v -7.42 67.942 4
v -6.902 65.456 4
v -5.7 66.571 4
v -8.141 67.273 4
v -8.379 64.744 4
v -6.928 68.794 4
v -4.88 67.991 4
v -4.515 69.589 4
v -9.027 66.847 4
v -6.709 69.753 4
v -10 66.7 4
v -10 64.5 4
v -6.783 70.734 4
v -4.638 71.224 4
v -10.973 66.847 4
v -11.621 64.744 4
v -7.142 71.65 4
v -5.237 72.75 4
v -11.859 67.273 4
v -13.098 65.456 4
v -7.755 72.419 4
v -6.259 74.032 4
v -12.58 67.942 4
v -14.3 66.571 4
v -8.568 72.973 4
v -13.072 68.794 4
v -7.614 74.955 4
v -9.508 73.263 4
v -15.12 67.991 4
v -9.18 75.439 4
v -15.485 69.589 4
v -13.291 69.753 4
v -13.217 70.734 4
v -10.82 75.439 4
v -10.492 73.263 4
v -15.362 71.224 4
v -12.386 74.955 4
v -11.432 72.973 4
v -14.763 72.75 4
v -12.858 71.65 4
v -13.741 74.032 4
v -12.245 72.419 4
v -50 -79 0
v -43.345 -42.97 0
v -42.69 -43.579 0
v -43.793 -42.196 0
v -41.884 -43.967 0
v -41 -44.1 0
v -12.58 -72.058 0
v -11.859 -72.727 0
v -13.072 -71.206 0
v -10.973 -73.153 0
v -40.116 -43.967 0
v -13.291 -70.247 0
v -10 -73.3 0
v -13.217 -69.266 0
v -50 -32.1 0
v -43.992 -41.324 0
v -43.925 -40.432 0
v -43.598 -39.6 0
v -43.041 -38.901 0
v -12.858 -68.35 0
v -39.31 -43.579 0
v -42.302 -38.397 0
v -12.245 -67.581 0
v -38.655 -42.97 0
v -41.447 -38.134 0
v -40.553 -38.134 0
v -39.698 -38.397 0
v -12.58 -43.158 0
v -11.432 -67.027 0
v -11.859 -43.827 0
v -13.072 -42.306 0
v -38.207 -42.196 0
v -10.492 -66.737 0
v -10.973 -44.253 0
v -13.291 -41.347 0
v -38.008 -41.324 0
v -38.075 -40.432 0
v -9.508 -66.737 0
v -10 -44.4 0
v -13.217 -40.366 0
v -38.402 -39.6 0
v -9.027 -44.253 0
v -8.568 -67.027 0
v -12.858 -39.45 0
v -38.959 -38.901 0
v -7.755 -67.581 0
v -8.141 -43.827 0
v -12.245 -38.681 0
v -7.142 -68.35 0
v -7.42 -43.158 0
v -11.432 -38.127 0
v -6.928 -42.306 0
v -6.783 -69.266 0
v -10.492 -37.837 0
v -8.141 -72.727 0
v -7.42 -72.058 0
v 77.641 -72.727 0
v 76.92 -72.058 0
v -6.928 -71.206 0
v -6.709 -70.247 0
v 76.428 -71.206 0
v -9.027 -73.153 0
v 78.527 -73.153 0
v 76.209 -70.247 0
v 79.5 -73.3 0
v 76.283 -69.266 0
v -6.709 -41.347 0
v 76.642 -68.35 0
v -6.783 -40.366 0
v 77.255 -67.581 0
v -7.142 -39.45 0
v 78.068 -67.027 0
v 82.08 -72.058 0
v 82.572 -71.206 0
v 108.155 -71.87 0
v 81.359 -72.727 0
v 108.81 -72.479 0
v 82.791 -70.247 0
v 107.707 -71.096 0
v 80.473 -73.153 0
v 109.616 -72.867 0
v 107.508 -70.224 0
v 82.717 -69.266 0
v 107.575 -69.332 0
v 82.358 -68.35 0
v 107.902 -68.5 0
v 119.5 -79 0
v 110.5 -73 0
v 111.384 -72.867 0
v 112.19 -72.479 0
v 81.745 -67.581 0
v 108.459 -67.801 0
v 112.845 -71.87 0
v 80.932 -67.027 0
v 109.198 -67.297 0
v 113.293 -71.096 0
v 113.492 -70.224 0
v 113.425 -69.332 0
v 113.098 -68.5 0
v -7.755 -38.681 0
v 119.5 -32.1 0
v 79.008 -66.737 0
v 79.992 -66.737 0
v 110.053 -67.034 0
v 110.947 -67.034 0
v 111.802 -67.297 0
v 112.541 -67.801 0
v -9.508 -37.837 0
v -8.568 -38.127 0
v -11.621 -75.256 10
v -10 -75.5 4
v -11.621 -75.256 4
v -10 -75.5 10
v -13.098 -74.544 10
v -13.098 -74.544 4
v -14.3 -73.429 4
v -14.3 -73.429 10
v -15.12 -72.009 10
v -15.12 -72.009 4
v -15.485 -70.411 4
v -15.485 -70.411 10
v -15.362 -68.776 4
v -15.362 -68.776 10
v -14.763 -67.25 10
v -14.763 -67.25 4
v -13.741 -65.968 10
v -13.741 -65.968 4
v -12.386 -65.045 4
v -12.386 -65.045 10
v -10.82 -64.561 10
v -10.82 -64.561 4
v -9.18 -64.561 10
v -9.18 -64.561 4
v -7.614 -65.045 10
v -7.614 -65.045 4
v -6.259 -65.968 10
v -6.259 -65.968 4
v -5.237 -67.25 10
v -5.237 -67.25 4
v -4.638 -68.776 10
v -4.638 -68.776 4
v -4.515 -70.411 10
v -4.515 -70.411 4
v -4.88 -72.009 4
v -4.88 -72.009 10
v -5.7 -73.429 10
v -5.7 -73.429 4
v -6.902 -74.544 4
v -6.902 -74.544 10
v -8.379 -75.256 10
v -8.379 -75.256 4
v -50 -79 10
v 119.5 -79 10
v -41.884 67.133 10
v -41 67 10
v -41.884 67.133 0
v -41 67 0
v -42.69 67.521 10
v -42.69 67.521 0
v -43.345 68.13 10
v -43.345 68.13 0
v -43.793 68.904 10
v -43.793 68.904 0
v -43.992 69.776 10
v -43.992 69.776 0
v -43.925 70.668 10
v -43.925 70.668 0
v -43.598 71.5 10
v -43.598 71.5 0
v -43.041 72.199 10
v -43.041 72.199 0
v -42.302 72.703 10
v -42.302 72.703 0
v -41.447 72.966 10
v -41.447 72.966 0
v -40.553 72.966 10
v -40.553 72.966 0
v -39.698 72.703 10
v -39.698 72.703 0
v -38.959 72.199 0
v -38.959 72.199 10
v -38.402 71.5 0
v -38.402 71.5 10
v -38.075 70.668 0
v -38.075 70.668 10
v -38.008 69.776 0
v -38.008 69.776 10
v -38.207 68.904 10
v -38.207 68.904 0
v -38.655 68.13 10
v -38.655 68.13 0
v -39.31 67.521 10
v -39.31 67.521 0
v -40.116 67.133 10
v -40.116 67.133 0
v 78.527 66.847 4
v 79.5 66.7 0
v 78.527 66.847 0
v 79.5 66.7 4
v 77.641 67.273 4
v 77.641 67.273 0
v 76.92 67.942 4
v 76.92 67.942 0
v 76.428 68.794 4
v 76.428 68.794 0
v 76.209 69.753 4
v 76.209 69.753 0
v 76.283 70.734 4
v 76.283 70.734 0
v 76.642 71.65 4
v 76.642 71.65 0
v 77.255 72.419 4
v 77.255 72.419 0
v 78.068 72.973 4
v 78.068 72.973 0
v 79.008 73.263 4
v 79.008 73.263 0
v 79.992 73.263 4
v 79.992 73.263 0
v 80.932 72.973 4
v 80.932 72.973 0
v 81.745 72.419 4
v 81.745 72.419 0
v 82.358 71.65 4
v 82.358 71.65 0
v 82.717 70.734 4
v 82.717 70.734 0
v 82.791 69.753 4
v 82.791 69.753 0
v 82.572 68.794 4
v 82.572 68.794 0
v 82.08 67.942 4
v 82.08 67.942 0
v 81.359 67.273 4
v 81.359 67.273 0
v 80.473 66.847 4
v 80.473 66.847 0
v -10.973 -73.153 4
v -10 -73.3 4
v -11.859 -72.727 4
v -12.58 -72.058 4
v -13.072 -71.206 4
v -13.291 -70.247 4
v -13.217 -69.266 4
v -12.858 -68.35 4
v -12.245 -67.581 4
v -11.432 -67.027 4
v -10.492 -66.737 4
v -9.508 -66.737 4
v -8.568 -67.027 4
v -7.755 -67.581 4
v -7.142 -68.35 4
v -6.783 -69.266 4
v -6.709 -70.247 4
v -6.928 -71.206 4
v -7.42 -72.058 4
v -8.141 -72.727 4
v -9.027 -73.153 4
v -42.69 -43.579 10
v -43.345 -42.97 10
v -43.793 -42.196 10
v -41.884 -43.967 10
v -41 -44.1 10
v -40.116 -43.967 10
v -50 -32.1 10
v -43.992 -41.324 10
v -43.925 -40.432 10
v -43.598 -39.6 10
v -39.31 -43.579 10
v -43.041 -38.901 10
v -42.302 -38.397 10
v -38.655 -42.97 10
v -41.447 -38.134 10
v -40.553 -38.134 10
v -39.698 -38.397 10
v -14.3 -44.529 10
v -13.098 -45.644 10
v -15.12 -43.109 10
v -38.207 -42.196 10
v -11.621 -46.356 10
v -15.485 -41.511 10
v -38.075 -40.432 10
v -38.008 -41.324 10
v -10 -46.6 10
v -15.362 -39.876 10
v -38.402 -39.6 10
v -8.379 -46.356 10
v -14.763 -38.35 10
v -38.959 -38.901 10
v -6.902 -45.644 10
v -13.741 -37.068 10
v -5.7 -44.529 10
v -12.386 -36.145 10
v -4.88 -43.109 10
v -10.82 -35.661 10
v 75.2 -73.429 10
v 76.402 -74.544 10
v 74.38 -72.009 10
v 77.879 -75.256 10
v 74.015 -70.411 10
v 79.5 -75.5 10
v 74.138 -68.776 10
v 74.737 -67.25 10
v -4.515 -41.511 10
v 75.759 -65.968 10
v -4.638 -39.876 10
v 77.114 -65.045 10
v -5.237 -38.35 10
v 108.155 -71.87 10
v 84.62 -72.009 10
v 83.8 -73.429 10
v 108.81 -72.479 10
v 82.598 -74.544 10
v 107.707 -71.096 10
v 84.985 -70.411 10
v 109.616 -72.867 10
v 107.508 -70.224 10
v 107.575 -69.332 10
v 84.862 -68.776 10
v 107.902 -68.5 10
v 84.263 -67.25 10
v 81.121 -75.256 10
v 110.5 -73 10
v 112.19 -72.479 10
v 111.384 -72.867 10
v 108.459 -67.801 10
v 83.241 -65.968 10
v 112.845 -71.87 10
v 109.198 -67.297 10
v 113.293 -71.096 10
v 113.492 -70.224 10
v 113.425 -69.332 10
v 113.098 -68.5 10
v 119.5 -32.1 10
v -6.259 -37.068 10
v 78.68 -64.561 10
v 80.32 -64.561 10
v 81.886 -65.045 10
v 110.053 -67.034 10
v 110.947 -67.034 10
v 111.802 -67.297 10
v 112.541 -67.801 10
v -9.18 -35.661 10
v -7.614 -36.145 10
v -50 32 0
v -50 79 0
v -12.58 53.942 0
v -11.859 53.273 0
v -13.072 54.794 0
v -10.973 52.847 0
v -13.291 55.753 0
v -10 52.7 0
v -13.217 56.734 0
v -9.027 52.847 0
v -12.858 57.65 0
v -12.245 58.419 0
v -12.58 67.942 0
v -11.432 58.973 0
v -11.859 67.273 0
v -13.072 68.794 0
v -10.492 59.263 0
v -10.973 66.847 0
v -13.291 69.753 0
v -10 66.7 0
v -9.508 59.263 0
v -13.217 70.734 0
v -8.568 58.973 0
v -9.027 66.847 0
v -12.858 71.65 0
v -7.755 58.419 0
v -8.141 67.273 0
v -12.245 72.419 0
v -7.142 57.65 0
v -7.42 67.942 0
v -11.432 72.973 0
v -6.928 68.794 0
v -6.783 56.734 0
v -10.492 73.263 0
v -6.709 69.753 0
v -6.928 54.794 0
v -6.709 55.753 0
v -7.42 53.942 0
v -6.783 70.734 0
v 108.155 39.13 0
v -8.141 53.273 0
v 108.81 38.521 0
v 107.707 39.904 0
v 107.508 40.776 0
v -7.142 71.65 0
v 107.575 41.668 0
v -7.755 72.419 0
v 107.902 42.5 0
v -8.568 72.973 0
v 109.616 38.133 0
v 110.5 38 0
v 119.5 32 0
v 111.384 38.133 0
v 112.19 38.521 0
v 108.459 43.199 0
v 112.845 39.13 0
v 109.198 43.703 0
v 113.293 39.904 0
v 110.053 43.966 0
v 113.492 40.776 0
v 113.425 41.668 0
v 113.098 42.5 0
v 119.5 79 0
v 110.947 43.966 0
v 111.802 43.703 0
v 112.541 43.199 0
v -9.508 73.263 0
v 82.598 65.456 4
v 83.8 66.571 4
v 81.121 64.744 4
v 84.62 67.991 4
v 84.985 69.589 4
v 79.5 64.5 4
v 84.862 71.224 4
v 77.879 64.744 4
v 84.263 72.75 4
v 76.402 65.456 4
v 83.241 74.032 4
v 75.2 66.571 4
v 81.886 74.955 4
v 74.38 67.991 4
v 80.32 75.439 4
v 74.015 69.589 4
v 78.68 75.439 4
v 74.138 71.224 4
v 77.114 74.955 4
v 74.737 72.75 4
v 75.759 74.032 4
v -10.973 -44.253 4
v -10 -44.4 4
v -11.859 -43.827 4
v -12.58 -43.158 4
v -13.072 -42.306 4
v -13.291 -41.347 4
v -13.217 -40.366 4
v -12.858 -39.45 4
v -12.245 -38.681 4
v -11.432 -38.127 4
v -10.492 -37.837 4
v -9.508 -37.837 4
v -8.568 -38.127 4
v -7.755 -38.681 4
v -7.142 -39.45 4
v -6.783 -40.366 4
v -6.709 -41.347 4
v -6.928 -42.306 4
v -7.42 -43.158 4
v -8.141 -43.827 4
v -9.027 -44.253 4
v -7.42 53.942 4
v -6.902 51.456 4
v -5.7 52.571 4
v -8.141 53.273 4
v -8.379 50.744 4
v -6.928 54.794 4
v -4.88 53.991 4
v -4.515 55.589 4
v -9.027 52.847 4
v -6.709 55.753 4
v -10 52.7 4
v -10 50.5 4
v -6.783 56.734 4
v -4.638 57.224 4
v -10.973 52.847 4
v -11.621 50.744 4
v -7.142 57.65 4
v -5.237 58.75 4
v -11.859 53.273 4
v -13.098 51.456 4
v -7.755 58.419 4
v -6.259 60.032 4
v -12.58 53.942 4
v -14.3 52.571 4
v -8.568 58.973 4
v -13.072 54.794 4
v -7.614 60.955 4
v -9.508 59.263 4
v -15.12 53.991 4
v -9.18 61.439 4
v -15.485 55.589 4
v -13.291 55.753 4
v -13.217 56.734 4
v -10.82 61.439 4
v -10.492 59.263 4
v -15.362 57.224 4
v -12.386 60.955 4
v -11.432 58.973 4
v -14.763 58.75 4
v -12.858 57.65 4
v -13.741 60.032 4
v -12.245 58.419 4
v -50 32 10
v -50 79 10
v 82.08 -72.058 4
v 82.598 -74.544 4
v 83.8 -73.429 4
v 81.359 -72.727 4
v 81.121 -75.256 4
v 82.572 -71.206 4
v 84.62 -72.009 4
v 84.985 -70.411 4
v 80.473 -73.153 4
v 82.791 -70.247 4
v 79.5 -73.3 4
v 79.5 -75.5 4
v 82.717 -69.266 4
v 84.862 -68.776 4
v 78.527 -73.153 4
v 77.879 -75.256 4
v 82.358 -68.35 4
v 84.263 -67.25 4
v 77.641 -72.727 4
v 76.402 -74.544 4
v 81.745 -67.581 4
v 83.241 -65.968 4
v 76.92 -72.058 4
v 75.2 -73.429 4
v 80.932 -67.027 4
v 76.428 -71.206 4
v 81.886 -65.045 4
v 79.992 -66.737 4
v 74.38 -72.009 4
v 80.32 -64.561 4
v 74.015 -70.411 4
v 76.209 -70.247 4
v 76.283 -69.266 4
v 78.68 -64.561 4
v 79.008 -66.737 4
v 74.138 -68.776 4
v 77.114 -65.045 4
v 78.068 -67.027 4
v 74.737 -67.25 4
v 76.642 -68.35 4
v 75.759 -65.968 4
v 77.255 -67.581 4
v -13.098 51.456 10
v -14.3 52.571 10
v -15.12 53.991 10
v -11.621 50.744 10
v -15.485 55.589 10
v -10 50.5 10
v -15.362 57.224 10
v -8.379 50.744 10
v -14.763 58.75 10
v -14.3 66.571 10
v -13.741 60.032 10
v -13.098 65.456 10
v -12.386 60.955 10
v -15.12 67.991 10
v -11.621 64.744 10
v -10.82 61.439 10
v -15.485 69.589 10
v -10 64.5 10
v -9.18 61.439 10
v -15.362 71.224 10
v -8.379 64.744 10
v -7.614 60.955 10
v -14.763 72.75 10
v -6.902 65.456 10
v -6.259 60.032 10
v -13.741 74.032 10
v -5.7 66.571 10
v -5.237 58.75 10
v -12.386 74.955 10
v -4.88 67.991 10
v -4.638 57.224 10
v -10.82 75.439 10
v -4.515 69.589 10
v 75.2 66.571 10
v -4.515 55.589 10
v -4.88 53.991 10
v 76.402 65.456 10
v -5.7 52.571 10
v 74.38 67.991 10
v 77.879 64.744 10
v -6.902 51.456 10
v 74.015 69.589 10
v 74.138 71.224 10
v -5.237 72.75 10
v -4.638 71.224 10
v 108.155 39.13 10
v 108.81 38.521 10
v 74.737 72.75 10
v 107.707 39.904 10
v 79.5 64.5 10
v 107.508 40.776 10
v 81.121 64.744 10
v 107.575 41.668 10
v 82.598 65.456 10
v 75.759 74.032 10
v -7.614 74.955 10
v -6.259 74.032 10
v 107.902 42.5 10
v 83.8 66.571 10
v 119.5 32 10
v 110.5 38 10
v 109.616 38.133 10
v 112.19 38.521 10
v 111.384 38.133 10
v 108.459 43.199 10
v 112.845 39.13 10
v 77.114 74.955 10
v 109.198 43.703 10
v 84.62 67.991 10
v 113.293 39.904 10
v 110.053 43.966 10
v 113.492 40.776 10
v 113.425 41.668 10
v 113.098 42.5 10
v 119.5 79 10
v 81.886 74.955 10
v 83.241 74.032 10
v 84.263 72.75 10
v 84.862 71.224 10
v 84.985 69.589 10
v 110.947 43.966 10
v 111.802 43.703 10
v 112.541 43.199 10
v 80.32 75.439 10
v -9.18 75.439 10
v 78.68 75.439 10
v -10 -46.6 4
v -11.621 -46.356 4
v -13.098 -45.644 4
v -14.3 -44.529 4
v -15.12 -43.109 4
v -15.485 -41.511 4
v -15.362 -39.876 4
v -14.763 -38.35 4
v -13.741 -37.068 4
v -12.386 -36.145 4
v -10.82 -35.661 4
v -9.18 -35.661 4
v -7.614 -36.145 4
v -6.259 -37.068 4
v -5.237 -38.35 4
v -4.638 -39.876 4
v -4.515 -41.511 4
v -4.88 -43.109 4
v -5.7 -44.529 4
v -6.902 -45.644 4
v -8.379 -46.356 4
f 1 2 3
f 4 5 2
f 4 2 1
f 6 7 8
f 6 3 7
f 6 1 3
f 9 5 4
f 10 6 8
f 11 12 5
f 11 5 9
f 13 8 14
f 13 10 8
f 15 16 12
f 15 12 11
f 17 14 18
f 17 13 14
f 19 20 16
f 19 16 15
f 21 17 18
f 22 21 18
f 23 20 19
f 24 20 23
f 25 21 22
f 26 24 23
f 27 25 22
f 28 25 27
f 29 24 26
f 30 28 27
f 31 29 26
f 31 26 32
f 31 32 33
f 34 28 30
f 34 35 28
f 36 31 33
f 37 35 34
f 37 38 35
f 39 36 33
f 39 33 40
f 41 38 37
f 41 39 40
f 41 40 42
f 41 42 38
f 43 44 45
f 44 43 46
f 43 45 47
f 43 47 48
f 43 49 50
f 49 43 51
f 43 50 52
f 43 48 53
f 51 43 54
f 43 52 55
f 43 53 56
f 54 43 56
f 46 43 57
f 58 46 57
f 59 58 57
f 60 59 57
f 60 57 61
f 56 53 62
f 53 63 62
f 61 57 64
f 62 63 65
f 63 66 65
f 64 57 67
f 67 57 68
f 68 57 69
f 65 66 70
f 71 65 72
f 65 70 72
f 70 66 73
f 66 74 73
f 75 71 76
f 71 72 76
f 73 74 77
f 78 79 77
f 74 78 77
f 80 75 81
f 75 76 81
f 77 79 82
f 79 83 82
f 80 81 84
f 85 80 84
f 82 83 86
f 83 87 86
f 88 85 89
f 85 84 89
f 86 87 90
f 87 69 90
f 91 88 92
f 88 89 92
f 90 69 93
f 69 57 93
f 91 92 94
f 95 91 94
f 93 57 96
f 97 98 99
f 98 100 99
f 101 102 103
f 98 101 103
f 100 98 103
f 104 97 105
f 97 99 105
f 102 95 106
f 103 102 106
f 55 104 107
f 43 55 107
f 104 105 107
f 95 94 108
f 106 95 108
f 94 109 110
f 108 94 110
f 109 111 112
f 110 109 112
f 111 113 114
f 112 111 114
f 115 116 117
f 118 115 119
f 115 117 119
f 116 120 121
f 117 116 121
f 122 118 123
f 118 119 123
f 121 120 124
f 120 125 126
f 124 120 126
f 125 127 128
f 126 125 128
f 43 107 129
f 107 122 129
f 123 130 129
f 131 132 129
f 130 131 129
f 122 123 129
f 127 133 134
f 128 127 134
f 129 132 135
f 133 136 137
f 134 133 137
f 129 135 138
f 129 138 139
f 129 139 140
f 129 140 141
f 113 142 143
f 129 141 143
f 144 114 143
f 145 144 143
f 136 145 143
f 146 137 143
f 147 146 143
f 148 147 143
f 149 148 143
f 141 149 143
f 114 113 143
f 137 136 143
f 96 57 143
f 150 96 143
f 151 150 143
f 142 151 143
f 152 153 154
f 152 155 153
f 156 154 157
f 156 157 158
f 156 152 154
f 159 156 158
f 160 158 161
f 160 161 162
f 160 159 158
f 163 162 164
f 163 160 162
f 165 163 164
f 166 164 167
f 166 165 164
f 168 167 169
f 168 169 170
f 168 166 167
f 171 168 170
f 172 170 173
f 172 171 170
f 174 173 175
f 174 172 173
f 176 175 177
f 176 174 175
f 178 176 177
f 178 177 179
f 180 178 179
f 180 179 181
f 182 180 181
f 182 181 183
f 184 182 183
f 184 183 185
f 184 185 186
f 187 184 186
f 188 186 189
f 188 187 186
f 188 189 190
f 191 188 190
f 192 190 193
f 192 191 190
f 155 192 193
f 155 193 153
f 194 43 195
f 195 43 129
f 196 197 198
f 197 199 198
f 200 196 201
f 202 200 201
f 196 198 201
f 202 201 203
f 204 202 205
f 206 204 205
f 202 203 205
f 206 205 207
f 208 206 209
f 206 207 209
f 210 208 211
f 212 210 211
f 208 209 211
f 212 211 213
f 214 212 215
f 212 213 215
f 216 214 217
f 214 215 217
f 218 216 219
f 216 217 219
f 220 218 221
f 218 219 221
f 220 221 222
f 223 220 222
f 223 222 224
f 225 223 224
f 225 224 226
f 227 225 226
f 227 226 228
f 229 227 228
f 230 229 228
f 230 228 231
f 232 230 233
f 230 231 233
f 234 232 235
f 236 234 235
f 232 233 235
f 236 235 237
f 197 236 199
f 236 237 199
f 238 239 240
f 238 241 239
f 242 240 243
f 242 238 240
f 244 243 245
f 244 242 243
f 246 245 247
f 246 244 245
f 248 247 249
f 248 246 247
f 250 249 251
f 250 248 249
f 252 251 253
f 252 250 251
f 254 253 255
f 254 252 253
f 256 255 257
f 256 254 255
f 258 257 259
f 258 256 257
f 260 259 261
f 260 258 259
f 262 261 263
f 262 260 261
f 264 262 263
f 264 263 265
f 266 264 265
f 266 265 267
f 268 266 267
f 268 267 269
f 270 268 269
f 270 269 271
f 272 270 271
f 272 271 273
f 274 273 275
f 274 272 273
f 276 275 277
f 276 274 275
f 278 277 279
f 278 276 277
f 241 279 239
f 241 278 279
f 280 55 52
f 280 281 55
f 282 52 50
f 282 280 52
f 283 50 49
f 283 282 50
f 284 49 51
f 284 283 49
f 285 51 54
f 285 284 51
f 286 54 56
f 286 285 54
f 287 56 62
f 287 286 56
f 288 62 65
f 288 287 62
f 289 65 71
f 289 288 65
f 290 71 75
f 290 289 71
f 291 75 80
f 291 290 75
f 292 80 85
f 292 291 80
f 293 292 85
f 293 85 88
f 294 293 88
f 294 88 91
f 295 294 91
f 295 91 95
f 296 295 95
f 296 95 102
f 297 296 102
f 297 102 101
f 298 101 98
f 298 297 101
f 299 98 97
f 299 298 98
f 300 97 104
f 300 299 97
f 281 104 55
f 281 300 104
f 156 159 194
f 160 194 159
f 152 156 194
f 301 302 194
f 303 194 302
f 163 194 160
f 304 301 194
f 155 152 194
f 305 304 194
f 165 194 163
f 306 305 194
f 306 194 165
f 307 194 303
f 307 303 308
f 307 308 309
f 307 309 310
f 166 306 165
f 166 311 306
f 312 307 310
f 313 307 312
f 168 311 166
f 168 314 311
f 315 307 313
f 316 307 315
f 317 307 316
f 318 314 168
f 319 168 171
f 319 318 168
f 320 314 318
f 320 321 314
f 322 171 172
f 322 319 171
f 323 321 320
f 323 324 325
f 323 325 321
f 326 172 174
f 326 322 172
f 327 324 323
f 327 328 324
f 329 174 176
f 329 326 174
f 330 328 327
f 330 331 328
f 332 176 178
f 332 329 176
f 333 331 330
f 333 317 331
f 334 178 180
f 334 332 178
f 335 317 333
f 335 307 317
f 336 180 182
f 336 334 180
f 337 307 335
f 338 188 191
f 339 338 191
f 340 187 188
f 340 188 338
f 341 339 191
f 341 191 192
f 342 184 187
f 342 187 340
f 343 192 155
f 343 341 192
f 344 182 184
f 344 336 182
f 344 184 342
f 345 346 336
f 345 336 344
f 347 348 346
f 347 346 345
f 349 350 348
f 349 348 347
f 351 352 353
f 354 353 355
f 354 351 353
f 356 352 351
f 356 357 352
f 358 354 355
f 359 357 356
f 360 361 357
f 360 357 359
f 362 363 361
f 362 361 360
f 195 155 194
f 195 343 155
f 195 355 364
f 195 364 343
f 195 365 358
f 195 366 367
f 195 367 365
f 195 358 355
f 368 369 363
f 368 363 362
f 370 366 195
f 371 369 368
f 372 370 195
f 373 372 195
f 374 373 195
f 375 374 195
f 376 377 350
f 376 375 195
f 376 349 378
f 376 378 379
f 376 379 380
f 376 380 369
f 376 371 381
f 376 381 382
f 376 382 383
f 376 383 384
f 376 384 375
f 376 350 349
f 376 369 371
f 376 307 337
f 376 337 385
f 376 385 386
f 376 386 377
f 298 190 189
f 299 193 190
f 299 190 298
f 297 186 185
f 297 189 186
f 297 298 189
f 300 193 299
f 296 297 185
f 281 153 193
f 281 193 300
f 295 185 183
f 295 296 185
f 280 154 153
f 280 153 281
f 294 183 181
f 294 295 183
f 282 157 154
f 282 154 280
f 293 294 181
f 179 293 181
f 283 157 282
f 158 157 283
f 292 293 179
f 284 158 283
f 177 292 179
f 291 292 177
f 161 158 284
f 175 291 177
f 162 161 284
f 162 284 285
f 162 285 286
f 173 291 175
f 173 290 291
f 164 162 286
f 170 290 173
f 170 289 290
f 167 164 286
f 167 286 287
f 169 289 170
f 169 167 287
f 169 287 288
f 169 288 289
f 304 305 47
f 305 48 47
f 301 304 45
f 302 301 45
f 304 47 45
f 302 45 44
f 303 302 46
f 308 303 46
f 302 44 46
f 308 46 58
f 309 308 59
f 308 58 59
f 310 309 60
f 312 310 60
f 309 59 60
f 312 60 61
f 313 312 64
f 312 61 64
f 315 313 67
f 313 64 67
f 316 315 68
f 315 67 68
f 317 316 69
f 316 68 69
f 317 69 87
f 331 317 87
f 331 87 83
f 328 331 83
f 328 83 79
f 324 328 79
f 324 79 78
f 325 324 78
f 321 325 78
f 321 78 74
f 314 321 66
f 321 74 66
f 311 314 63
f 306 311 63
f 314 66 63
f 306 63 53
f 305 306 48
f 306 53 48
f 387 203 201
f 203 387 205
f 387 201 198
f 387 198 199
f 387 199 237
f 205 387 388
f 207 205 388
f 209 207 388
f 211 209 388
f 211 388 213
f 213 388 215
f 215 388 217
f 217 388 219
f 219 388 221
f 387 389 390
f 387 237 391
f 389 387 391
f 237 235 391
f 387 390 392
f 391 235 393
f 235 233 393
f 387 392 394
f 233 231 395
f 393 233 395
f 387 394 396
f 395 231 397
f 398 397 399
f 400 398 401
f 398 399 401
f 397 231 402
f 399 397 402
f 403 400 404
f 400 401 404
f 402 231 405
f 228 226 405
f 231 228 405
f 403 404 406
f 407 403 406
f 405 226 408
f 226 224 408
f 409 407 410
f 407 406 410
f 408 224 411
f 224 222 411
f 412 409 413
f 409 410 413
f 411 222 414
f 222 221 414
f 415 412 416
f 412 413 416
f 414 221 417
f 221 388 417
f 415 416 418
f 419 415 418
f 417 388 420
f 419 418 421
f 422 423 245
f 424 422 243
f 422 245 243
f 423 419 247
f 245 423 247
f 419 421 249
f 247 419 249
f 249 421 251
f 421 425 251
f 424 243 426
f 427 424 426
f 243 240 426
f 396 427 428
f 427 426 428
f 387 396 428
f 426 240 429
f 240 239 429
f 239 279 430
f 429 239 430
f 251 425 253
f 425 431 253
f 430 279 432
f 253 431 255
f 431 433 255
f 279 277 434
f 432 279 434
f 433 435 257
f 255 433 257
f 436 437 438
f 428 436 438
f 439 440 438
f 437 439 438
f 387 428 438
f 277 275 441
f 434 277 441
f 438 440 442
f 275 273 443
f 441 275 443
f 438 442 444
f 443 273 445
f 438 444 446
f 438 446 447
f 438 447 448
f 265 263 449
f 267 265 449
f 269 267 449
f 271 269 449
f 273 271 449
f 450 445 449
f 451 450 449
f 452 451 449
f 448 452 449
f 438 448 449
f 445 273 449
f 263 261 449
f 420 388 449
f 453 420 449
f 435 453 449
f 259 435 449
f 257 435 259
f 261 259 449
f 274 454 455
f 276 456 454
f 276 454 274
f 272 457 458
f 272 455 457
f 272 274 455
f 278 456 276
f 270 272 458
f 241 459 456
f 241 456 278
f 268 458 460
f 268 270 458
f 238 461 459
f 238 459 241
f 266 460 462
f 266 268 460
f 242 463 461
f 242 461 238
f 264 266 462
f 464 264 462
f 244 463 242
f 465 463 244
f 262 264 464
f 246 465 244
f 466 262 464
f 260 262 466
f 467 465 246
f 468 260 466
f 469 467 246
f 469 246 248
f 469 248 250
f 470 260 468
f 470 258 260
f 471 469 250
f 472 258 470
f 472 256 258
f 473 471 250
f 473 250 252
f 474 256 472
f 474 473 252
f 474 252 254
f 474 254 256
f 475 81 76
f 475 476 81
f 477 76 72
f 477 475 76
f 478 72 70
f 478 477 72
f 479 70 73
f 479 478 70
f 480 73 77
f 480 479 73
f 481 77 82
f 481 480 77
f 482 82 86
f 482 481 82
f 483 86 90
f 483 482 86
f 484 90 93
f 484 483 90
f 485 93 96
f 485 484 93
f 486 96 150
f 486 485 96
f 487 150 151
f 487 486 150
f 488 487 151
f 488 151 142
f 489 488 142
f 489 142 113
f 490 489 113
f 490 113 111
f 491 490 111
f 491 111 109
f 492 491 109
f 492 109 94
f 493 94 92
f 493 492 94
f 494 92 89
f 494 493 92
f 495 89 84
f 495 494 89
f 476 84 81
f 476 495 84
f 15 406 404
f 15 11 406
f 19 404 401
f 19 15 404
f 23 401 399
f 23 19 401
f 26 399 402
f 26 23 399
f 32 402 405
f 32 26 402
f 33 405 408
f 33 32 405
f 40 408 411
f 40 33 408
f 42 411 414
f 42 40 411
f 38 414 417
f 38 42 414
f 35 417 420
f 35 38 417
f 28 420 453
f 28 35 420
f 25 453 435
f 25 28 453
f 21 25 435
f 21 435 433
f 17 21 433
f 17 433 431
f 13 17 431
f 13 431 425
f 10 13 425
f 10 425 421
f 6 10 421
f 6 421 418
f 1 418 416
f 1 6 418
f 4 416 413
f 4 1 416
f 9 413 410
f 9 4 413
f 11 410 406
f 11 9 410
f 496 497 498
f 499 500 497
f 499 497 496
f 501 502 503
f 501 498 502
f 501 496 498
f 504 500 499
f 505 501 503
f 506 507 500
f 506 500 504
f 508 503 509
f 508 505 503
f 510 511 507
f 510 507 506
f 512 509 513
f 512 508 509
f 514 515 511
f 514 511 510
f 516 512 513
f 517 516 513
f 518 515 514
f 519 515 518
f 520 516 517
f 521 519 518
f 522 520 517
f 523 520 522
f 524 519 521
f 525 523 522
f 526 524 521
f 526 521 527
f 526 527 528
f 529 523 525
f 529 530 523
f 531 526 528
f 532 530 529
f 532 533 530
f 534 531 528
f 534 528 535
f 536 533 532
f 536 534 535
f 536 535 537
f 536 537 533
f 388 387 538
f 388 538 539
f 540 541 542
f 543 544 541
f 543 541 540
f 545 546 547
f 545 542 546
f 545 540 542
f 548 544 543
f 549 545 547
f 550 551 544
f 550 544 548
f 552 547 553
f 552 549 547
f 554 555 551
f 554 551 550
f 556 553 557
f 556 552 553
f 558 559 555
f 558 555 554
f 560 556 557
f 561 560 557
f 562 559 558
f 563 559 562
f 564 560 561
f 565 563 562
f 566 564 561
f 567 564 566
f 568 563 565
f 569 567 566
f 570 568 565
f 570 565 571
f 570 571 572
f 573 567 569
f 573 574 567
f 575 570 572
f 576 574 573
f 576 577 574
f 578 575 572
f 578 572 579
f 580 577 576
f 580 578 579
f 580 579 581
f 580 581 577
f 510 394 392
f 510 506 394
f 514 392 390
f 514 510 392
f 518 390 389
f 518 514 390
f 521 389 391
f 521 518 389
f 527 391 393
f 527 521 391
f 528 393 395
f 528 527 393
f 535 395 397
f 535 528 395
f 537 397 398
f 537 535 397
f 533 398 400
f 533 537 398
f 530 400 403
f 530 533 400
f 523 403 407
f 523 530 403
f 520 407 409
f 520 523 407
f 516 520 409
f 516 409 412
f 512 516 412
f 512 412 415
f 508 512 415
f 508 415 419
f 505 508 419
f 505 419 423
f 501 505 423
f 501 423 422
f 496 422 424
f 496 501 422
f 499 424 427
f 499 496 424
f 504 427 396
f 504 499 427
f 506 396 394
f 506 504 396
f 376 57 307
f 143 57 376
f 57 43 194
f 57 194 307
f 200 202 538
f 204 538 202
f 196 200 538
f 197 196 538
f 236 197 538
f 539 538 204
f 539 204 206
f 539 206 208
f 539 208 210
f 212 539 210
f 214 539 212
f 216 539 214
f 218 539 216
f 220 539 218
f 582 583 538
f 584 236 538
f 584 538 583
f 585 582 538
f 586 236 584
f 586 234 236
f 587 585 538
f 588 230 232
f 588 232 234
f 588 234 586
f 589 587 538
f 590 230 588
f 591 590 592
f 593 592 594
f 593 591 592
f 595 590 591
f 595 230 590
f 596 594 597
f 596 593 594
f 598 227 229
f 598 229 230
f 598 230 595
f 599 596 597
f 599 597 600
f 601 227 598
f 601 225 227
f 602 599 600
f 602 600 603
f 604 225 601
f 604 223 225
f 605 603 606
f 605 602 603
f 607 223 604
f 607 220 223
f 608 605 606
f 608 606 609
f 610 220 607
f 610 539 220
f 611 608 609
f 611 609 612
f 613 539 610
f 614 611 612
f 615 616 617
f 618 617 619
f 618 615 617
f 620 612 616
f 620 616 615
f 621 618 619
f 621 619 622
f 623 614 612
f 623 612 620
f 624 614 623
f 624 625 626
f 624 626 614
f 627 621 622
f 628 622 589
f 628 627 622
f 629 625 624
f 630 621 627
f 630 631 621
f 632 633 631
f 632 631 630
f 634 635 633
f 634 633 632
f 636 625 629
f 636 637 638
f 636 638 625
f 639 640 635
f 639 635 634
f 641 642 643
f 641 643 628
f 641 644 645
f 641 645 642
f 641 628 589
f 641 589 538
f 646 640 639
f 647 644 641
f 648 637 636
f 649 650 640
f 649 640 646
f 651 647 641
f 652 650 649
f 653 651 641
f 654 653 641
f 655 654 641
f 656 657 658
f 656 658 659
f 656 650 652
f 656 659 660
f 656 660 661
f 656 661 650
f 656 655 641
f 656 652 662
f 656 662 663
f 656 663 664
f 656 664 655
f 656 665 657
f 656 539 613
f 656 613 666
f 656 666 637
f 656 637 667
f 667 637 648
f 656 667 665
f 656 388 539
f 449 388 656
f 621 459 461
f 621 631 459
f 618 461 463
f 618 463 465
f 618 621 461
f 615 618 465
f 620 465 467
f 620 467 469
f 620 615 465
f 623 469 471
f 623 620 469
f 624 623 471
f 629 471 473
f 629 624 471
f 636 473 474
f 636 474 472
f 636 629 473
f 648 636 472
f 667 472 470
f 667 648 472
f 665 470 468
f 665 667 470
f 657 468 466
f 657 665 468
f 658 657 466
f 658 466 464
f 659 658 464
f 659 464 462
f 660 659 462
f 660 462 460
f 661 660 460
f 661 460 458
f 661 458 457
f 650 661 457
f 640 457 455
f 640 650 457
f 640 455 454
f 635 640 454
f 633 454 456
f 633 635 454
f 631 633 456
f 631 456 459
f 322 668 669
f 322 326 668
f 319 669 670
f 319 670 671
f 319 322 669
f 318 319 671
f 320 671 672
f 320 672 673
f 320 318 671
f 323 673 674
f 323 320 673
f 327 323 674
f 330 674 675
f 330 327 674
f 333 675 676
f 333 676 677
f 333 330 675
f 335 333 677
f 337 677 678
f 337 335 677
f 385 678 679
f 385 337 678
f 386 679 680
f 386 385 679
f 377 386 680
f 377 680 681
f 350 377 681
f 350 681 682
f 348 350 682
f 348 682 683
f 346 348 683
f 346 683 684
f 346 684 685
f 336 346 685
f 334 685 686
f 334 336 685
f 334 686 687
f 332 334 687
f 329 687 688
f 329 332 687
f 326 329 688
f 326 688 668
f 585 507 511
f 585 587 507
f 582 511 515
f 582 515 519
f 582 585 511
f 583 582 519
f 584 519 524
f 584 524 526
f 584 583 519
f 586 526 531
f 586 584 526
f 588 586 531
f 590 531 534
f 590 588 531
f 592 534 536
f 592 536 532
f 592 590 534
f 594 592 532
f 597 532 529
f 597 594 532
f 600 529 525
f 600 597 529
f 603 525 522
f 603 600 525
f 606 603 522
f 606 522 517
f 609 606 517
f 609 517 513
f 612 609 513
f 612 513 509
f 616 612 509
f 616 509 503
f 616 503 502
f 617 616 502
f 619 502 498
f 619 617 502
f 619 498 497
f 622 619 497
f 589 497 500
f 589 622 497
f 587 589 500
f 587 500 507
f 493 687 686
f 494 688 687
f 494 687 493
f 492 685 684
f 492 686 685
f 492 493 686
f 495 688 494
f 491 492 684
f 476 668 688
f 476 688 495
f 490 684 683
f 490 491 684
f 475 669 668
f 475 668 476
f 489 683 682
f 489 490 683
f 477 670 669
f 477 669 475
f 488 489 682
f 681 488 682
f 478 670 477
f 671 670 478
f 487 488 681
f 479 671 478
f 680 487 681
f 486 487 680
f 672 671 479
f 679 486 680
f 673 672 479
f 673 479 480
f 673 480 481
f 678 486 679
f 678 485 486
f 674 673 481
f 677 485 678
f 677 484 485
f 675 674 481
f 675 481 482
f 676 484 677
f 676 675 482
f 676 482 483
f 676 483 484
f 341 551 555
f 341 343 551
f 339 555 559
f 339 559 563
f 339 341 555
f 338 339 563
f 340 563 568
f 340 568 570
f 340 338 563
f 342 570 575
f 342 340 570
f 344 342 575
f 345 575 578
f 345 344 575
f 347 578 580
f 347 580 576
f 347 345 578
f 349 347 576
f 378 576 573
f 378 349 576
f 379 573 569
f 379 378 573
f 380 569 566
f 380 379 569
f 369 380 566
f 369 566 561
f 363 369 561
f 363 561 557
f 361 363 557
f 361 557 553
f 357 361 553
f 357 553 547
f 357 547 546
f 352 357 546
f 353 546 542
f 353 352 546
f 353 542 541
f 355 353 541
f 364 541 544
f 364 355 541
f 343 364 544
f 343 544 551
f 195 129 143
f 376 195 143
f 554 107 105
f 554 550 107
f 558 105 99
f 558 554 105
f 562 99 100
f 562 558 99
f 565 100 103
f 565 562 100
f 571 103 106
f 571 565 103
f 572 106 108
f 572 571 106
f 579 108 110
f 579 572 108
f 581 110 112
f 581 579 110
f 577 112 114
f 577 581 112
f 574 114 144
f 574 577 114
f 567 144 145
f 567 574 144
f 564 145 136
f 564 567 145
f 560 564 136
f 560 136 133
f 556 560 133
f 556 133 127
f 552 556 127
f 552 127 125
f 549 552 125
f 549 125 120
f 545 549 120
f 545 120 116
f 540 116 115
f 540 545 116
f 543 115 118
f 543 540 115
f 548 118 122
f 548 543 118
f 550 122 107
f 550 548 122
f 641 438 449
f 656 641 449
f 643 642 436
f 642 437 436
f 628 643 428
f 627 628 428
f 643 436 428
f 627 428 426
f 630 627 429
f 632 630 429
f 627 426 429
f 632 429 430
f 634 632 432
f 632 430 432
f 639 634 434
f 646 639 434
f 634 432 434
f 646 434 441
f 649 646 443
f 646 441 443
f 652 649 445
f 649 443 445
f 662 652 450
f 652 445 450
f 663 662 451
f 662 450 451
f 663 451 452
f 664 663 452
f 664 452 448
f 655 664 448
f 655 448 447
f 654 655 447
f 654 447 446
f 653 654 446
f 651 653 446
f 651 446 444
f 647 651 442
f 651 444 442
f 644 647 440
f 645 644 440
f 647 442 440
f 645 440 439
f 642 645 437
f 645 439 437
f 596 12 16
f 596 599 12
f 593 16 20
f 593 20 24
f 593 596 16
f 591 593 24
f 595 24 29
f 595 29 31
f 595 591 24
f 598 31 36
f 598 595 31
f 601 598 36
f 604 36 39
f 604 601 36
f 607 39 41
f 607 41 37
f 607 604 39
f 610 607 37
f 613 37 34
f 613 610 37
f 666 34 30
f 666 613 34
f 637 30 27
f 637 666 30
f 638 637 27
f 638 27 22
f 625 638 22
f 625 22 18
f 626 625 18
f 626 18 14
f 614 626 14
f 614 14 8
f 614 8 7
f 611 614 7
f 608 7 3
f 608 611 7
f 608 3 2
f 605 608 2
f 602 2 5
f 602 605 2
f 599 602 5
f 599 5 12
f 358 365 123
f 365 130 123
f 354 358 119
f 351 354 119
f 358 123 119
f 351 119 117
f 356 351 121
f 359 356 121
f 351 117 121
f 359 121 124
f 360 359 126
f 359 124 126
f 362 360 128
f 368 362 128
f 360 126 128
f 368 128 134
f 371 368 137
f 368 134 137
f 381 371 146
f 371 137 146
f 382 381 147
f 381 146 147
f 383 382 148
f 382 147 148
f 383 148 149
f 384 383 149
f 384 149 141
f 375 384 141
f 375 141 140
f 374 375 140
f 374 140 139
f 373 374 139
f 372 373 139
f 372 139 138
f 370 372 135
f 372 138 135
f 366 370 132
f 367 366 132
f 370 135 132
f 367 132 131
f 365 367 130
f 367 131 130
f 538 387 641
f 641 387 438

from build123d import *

# Parameters (mm, degrees)
SKETCH2_W                                = 169.5
SKETCH2_H                                = 46.9
BOSS_EXTRUDE1_DEPTH                      = 10
SKETCH2_H_2                              = 47
BOSS_EXTRUDE1_2_DEPTH                    = 10
CBORE_FOR_M6_SHCS1_AT_2_COUNT            = 2
CBORE_FOR_M6_SHCS1_AT_2_PITCH            = 89.5
CBORE_FOR_M6_SHCS1_AT_3_COUNT            = 2
CBORE_FOR_M6_SHCS1_AT_3_PITCH            = 94.050305688
CBORE_FOR_M6_SHCS2_AT_2_COUNT            = 2
CBORE_FOR_M6_SHCS2_AT_2_PITCH            = 90.58835466
CBORE_FOR_M6_SHCS2_AT_3_COUNT            = 2
CBORE_FOR_M6_SHCS2_AT_3_PITCH            = 89.5
SKETCH8_W                                = 3
SKETCH8_H                                = 10
F_6_0MM_CLEARANCE_DOWEL_HOLE1_AT_2_COUNT = 2
F_6_0MM_CLEARANCE_DOWEL_HOLE1_AT_2_PITCH = 154.250607778
SKETCH10_W                               = 3
SKETCH10_H                               = 10
F_6_0MM_CLEARANCE_DOWEL_HOLE2_AT_2_COUNT = 2
F_6_0MM_CLEARANCE_DOWEL_HOLE2_AT_2_PITCH = 154.231838477


with BuildPart() as part:
    # Sketch2 → Boss-Extrude1 (new body)
    with BuildSketch(Plane.XY):
        with Locations((34.75, -55.55)):
            Rectangle(SKETCH2_W, SKETCH2_H)
    extrude(amount=BOSS_EXTRUDE1_DEPTH)

    # Sketch4 → CBORE for M6 SHCS1 (revolve, cut)
    with BuildSketch(Plane(origin=(79.5, -70, 10), x_dir=(0, -1, 0), z_dir=(1, 0, 0))):
        Polygon((0, 0), (0, 10), (3.3, 10), (3.3, 6), (5.5, 6), (5.5, 0), align=None)
    cbore_for_m6_shcs1 = revolve(axis=Axis((79.5, -70, 16.35), (0, 0, -1)), mode=Mode.SUBTRACT)

    # CBORE for M6 SHCS1 at 2: CBORE for M6 SHCS1 ×2
    with Locations(*[(-i * CBORE_FOR_M6_SHCS1_AT_2_PITCH, 0, 0) for i in range(1, CBORE_FOR_M6_SHCS1_AT_2_COUNT)]):
        add(cbore_for_m6_shcs1, mode=Mode.SUBTRACT)

    # CBORE for M6 SHCS1 at 3: CBORE for M6 SHCS1 ×2
    with Locations(*[Vector(-0.9516183849198379, 0.3072823611640593, 0) * (i * CBORE_FOR_M6_SHCS1_AT_3_PITCH) for i in range(1, CBORE_FOR_M6_SHCS1_AT_3_COUNT)]):
        add(cbore_for_m6_shcs1, mode=Mode.SUBTRACT)

    # Sketch10 → Ø6.0mm Clearance Dowel Hole2 (revolve, cut)
    with BuildSketch(Plane(origin=(-41, -41.1, 10), x_dir=(0, -1, 0), z_dir=(1, 0, 0))):
        with Locations((1.5, 5)):
            Rectangle(SKETCH10_W, SKETCH10_H)
    f_6_0mm_clearance_dowel_hole2 = revolve(axis=Axis((-41, -41.1, 16.35), (0, 0, -1)), mode=Mode.SUBTRACT)

    # Ø6.0mm Clearance Dowel Hole2 at 2: Ø6.0mm Clearance Dowel Hole2 ×2
    with Locations(*[Vector(0.9822874543674588, -0.18738024707075618, 0) * (i * F_6_0MM_CLEARANCE_DOWEL_HOLE2_AT_2_PITCH) for i in range(1, F_6_0MM_CLEARANCE_DOWEL_HOLE2_AT_2_COUNT)]):
        add(f_6_0mm_clearance_dowel_hole2, mode=Mode.SUBTRACT)


with BuildPart() as body_2:
    # Sketch2 → Boss-Extrude1 2 (new body)
    with BuildSketch(Plane.XY):
        with Locations((34.75, 55.5)):
            Rectangle(SKETCH2_W, SKETCH2_H_2)
    extrude(amount=BOSS_EXTRUDE1_2_DEPTH)

    # Sketch6 → CBORE for M6 SHCS2 (revolve, cut)
    with BuildSketch(Plane(origin=(79.5, 70, 10), x_dir=(0, -1, 0), z_dir=(1, 0, 0))):
        Polygon((0, 0), (0, 10), (3.3, 10), (3.3, 6), (5.5, 6), (5.5, 0), align=None)
    cbore_for_m6_shcs2 = revolve(axis=Axis((79.5, 70, 16.35), (0, 0, -1)), mode=Mode.SUBTRACT)

    # CBORE for M6 SHCS2 at 2: CBORE for M6 SHCS2 ×2
    with Locations(*[Vector(-0.9879857111429782, -0.15454525090504667, 0) * (i * CBORE_FOR_M6_SHCS2_AT_2_PITCH) for i in range(1, CBORE_FOR_M6_SHCS2_AT_2_COUNT)]):
        add(cbore_for_m6_shcs2, mode=Mode.SUBTRACT)

    # CBORE for M6 SHCS2 at 3: CBORE for M6 SHCS2 ×2
    with Locations(*[(-i * CBORE_FOR_M6_SHCS2_AT_3_PITCH, 0, 0) for i in range(1, CBORE_FOR_M6_SHCS2_AT_3_COUNT)]):
        add(cbore_for_m6_shcs2, mode=Mode.SUBTRACT)

    # Sketch8 → Ø6.0mm Clearance Dowel Hole1 (revolve, cut)
    with BuildSketch(Plane(origin=(-41, 70, 10), x_dir=(0, -1, 0), z_dir=(1, 0, 0))):
        with Locations((1.5, 5)):
            Rectangle(SKETCH8_W, SKETCH8_H)
    f_6_0mm_clearance_dowel_hole1 = revolve(axis=Axis((-41, 70, 16.35), (0, 0, -1)), mode=Mode.SUBTRACT)

    # Ø6.0mm Clearance Dowel Hole1 at 2: Ø6.0mm Clearance Dowel Hole1 ×2
    with Locations(*[Vector(0.9821679290733613, -0.18800574219886163, 0) * (i * F_6_0MM_CLEARANCE_DOWEL_HOLE1_AT_2_PITCH) for i in range(1, F_6_0MM_CLEARANCE_DOWEL_HOLE1_AT_2_COUNT)]):
        add(f_6_0mm_clearance_dowel_hole1, mode=Mode.SUBTRACT)


solid = Compound([part.part, body_2.part])
